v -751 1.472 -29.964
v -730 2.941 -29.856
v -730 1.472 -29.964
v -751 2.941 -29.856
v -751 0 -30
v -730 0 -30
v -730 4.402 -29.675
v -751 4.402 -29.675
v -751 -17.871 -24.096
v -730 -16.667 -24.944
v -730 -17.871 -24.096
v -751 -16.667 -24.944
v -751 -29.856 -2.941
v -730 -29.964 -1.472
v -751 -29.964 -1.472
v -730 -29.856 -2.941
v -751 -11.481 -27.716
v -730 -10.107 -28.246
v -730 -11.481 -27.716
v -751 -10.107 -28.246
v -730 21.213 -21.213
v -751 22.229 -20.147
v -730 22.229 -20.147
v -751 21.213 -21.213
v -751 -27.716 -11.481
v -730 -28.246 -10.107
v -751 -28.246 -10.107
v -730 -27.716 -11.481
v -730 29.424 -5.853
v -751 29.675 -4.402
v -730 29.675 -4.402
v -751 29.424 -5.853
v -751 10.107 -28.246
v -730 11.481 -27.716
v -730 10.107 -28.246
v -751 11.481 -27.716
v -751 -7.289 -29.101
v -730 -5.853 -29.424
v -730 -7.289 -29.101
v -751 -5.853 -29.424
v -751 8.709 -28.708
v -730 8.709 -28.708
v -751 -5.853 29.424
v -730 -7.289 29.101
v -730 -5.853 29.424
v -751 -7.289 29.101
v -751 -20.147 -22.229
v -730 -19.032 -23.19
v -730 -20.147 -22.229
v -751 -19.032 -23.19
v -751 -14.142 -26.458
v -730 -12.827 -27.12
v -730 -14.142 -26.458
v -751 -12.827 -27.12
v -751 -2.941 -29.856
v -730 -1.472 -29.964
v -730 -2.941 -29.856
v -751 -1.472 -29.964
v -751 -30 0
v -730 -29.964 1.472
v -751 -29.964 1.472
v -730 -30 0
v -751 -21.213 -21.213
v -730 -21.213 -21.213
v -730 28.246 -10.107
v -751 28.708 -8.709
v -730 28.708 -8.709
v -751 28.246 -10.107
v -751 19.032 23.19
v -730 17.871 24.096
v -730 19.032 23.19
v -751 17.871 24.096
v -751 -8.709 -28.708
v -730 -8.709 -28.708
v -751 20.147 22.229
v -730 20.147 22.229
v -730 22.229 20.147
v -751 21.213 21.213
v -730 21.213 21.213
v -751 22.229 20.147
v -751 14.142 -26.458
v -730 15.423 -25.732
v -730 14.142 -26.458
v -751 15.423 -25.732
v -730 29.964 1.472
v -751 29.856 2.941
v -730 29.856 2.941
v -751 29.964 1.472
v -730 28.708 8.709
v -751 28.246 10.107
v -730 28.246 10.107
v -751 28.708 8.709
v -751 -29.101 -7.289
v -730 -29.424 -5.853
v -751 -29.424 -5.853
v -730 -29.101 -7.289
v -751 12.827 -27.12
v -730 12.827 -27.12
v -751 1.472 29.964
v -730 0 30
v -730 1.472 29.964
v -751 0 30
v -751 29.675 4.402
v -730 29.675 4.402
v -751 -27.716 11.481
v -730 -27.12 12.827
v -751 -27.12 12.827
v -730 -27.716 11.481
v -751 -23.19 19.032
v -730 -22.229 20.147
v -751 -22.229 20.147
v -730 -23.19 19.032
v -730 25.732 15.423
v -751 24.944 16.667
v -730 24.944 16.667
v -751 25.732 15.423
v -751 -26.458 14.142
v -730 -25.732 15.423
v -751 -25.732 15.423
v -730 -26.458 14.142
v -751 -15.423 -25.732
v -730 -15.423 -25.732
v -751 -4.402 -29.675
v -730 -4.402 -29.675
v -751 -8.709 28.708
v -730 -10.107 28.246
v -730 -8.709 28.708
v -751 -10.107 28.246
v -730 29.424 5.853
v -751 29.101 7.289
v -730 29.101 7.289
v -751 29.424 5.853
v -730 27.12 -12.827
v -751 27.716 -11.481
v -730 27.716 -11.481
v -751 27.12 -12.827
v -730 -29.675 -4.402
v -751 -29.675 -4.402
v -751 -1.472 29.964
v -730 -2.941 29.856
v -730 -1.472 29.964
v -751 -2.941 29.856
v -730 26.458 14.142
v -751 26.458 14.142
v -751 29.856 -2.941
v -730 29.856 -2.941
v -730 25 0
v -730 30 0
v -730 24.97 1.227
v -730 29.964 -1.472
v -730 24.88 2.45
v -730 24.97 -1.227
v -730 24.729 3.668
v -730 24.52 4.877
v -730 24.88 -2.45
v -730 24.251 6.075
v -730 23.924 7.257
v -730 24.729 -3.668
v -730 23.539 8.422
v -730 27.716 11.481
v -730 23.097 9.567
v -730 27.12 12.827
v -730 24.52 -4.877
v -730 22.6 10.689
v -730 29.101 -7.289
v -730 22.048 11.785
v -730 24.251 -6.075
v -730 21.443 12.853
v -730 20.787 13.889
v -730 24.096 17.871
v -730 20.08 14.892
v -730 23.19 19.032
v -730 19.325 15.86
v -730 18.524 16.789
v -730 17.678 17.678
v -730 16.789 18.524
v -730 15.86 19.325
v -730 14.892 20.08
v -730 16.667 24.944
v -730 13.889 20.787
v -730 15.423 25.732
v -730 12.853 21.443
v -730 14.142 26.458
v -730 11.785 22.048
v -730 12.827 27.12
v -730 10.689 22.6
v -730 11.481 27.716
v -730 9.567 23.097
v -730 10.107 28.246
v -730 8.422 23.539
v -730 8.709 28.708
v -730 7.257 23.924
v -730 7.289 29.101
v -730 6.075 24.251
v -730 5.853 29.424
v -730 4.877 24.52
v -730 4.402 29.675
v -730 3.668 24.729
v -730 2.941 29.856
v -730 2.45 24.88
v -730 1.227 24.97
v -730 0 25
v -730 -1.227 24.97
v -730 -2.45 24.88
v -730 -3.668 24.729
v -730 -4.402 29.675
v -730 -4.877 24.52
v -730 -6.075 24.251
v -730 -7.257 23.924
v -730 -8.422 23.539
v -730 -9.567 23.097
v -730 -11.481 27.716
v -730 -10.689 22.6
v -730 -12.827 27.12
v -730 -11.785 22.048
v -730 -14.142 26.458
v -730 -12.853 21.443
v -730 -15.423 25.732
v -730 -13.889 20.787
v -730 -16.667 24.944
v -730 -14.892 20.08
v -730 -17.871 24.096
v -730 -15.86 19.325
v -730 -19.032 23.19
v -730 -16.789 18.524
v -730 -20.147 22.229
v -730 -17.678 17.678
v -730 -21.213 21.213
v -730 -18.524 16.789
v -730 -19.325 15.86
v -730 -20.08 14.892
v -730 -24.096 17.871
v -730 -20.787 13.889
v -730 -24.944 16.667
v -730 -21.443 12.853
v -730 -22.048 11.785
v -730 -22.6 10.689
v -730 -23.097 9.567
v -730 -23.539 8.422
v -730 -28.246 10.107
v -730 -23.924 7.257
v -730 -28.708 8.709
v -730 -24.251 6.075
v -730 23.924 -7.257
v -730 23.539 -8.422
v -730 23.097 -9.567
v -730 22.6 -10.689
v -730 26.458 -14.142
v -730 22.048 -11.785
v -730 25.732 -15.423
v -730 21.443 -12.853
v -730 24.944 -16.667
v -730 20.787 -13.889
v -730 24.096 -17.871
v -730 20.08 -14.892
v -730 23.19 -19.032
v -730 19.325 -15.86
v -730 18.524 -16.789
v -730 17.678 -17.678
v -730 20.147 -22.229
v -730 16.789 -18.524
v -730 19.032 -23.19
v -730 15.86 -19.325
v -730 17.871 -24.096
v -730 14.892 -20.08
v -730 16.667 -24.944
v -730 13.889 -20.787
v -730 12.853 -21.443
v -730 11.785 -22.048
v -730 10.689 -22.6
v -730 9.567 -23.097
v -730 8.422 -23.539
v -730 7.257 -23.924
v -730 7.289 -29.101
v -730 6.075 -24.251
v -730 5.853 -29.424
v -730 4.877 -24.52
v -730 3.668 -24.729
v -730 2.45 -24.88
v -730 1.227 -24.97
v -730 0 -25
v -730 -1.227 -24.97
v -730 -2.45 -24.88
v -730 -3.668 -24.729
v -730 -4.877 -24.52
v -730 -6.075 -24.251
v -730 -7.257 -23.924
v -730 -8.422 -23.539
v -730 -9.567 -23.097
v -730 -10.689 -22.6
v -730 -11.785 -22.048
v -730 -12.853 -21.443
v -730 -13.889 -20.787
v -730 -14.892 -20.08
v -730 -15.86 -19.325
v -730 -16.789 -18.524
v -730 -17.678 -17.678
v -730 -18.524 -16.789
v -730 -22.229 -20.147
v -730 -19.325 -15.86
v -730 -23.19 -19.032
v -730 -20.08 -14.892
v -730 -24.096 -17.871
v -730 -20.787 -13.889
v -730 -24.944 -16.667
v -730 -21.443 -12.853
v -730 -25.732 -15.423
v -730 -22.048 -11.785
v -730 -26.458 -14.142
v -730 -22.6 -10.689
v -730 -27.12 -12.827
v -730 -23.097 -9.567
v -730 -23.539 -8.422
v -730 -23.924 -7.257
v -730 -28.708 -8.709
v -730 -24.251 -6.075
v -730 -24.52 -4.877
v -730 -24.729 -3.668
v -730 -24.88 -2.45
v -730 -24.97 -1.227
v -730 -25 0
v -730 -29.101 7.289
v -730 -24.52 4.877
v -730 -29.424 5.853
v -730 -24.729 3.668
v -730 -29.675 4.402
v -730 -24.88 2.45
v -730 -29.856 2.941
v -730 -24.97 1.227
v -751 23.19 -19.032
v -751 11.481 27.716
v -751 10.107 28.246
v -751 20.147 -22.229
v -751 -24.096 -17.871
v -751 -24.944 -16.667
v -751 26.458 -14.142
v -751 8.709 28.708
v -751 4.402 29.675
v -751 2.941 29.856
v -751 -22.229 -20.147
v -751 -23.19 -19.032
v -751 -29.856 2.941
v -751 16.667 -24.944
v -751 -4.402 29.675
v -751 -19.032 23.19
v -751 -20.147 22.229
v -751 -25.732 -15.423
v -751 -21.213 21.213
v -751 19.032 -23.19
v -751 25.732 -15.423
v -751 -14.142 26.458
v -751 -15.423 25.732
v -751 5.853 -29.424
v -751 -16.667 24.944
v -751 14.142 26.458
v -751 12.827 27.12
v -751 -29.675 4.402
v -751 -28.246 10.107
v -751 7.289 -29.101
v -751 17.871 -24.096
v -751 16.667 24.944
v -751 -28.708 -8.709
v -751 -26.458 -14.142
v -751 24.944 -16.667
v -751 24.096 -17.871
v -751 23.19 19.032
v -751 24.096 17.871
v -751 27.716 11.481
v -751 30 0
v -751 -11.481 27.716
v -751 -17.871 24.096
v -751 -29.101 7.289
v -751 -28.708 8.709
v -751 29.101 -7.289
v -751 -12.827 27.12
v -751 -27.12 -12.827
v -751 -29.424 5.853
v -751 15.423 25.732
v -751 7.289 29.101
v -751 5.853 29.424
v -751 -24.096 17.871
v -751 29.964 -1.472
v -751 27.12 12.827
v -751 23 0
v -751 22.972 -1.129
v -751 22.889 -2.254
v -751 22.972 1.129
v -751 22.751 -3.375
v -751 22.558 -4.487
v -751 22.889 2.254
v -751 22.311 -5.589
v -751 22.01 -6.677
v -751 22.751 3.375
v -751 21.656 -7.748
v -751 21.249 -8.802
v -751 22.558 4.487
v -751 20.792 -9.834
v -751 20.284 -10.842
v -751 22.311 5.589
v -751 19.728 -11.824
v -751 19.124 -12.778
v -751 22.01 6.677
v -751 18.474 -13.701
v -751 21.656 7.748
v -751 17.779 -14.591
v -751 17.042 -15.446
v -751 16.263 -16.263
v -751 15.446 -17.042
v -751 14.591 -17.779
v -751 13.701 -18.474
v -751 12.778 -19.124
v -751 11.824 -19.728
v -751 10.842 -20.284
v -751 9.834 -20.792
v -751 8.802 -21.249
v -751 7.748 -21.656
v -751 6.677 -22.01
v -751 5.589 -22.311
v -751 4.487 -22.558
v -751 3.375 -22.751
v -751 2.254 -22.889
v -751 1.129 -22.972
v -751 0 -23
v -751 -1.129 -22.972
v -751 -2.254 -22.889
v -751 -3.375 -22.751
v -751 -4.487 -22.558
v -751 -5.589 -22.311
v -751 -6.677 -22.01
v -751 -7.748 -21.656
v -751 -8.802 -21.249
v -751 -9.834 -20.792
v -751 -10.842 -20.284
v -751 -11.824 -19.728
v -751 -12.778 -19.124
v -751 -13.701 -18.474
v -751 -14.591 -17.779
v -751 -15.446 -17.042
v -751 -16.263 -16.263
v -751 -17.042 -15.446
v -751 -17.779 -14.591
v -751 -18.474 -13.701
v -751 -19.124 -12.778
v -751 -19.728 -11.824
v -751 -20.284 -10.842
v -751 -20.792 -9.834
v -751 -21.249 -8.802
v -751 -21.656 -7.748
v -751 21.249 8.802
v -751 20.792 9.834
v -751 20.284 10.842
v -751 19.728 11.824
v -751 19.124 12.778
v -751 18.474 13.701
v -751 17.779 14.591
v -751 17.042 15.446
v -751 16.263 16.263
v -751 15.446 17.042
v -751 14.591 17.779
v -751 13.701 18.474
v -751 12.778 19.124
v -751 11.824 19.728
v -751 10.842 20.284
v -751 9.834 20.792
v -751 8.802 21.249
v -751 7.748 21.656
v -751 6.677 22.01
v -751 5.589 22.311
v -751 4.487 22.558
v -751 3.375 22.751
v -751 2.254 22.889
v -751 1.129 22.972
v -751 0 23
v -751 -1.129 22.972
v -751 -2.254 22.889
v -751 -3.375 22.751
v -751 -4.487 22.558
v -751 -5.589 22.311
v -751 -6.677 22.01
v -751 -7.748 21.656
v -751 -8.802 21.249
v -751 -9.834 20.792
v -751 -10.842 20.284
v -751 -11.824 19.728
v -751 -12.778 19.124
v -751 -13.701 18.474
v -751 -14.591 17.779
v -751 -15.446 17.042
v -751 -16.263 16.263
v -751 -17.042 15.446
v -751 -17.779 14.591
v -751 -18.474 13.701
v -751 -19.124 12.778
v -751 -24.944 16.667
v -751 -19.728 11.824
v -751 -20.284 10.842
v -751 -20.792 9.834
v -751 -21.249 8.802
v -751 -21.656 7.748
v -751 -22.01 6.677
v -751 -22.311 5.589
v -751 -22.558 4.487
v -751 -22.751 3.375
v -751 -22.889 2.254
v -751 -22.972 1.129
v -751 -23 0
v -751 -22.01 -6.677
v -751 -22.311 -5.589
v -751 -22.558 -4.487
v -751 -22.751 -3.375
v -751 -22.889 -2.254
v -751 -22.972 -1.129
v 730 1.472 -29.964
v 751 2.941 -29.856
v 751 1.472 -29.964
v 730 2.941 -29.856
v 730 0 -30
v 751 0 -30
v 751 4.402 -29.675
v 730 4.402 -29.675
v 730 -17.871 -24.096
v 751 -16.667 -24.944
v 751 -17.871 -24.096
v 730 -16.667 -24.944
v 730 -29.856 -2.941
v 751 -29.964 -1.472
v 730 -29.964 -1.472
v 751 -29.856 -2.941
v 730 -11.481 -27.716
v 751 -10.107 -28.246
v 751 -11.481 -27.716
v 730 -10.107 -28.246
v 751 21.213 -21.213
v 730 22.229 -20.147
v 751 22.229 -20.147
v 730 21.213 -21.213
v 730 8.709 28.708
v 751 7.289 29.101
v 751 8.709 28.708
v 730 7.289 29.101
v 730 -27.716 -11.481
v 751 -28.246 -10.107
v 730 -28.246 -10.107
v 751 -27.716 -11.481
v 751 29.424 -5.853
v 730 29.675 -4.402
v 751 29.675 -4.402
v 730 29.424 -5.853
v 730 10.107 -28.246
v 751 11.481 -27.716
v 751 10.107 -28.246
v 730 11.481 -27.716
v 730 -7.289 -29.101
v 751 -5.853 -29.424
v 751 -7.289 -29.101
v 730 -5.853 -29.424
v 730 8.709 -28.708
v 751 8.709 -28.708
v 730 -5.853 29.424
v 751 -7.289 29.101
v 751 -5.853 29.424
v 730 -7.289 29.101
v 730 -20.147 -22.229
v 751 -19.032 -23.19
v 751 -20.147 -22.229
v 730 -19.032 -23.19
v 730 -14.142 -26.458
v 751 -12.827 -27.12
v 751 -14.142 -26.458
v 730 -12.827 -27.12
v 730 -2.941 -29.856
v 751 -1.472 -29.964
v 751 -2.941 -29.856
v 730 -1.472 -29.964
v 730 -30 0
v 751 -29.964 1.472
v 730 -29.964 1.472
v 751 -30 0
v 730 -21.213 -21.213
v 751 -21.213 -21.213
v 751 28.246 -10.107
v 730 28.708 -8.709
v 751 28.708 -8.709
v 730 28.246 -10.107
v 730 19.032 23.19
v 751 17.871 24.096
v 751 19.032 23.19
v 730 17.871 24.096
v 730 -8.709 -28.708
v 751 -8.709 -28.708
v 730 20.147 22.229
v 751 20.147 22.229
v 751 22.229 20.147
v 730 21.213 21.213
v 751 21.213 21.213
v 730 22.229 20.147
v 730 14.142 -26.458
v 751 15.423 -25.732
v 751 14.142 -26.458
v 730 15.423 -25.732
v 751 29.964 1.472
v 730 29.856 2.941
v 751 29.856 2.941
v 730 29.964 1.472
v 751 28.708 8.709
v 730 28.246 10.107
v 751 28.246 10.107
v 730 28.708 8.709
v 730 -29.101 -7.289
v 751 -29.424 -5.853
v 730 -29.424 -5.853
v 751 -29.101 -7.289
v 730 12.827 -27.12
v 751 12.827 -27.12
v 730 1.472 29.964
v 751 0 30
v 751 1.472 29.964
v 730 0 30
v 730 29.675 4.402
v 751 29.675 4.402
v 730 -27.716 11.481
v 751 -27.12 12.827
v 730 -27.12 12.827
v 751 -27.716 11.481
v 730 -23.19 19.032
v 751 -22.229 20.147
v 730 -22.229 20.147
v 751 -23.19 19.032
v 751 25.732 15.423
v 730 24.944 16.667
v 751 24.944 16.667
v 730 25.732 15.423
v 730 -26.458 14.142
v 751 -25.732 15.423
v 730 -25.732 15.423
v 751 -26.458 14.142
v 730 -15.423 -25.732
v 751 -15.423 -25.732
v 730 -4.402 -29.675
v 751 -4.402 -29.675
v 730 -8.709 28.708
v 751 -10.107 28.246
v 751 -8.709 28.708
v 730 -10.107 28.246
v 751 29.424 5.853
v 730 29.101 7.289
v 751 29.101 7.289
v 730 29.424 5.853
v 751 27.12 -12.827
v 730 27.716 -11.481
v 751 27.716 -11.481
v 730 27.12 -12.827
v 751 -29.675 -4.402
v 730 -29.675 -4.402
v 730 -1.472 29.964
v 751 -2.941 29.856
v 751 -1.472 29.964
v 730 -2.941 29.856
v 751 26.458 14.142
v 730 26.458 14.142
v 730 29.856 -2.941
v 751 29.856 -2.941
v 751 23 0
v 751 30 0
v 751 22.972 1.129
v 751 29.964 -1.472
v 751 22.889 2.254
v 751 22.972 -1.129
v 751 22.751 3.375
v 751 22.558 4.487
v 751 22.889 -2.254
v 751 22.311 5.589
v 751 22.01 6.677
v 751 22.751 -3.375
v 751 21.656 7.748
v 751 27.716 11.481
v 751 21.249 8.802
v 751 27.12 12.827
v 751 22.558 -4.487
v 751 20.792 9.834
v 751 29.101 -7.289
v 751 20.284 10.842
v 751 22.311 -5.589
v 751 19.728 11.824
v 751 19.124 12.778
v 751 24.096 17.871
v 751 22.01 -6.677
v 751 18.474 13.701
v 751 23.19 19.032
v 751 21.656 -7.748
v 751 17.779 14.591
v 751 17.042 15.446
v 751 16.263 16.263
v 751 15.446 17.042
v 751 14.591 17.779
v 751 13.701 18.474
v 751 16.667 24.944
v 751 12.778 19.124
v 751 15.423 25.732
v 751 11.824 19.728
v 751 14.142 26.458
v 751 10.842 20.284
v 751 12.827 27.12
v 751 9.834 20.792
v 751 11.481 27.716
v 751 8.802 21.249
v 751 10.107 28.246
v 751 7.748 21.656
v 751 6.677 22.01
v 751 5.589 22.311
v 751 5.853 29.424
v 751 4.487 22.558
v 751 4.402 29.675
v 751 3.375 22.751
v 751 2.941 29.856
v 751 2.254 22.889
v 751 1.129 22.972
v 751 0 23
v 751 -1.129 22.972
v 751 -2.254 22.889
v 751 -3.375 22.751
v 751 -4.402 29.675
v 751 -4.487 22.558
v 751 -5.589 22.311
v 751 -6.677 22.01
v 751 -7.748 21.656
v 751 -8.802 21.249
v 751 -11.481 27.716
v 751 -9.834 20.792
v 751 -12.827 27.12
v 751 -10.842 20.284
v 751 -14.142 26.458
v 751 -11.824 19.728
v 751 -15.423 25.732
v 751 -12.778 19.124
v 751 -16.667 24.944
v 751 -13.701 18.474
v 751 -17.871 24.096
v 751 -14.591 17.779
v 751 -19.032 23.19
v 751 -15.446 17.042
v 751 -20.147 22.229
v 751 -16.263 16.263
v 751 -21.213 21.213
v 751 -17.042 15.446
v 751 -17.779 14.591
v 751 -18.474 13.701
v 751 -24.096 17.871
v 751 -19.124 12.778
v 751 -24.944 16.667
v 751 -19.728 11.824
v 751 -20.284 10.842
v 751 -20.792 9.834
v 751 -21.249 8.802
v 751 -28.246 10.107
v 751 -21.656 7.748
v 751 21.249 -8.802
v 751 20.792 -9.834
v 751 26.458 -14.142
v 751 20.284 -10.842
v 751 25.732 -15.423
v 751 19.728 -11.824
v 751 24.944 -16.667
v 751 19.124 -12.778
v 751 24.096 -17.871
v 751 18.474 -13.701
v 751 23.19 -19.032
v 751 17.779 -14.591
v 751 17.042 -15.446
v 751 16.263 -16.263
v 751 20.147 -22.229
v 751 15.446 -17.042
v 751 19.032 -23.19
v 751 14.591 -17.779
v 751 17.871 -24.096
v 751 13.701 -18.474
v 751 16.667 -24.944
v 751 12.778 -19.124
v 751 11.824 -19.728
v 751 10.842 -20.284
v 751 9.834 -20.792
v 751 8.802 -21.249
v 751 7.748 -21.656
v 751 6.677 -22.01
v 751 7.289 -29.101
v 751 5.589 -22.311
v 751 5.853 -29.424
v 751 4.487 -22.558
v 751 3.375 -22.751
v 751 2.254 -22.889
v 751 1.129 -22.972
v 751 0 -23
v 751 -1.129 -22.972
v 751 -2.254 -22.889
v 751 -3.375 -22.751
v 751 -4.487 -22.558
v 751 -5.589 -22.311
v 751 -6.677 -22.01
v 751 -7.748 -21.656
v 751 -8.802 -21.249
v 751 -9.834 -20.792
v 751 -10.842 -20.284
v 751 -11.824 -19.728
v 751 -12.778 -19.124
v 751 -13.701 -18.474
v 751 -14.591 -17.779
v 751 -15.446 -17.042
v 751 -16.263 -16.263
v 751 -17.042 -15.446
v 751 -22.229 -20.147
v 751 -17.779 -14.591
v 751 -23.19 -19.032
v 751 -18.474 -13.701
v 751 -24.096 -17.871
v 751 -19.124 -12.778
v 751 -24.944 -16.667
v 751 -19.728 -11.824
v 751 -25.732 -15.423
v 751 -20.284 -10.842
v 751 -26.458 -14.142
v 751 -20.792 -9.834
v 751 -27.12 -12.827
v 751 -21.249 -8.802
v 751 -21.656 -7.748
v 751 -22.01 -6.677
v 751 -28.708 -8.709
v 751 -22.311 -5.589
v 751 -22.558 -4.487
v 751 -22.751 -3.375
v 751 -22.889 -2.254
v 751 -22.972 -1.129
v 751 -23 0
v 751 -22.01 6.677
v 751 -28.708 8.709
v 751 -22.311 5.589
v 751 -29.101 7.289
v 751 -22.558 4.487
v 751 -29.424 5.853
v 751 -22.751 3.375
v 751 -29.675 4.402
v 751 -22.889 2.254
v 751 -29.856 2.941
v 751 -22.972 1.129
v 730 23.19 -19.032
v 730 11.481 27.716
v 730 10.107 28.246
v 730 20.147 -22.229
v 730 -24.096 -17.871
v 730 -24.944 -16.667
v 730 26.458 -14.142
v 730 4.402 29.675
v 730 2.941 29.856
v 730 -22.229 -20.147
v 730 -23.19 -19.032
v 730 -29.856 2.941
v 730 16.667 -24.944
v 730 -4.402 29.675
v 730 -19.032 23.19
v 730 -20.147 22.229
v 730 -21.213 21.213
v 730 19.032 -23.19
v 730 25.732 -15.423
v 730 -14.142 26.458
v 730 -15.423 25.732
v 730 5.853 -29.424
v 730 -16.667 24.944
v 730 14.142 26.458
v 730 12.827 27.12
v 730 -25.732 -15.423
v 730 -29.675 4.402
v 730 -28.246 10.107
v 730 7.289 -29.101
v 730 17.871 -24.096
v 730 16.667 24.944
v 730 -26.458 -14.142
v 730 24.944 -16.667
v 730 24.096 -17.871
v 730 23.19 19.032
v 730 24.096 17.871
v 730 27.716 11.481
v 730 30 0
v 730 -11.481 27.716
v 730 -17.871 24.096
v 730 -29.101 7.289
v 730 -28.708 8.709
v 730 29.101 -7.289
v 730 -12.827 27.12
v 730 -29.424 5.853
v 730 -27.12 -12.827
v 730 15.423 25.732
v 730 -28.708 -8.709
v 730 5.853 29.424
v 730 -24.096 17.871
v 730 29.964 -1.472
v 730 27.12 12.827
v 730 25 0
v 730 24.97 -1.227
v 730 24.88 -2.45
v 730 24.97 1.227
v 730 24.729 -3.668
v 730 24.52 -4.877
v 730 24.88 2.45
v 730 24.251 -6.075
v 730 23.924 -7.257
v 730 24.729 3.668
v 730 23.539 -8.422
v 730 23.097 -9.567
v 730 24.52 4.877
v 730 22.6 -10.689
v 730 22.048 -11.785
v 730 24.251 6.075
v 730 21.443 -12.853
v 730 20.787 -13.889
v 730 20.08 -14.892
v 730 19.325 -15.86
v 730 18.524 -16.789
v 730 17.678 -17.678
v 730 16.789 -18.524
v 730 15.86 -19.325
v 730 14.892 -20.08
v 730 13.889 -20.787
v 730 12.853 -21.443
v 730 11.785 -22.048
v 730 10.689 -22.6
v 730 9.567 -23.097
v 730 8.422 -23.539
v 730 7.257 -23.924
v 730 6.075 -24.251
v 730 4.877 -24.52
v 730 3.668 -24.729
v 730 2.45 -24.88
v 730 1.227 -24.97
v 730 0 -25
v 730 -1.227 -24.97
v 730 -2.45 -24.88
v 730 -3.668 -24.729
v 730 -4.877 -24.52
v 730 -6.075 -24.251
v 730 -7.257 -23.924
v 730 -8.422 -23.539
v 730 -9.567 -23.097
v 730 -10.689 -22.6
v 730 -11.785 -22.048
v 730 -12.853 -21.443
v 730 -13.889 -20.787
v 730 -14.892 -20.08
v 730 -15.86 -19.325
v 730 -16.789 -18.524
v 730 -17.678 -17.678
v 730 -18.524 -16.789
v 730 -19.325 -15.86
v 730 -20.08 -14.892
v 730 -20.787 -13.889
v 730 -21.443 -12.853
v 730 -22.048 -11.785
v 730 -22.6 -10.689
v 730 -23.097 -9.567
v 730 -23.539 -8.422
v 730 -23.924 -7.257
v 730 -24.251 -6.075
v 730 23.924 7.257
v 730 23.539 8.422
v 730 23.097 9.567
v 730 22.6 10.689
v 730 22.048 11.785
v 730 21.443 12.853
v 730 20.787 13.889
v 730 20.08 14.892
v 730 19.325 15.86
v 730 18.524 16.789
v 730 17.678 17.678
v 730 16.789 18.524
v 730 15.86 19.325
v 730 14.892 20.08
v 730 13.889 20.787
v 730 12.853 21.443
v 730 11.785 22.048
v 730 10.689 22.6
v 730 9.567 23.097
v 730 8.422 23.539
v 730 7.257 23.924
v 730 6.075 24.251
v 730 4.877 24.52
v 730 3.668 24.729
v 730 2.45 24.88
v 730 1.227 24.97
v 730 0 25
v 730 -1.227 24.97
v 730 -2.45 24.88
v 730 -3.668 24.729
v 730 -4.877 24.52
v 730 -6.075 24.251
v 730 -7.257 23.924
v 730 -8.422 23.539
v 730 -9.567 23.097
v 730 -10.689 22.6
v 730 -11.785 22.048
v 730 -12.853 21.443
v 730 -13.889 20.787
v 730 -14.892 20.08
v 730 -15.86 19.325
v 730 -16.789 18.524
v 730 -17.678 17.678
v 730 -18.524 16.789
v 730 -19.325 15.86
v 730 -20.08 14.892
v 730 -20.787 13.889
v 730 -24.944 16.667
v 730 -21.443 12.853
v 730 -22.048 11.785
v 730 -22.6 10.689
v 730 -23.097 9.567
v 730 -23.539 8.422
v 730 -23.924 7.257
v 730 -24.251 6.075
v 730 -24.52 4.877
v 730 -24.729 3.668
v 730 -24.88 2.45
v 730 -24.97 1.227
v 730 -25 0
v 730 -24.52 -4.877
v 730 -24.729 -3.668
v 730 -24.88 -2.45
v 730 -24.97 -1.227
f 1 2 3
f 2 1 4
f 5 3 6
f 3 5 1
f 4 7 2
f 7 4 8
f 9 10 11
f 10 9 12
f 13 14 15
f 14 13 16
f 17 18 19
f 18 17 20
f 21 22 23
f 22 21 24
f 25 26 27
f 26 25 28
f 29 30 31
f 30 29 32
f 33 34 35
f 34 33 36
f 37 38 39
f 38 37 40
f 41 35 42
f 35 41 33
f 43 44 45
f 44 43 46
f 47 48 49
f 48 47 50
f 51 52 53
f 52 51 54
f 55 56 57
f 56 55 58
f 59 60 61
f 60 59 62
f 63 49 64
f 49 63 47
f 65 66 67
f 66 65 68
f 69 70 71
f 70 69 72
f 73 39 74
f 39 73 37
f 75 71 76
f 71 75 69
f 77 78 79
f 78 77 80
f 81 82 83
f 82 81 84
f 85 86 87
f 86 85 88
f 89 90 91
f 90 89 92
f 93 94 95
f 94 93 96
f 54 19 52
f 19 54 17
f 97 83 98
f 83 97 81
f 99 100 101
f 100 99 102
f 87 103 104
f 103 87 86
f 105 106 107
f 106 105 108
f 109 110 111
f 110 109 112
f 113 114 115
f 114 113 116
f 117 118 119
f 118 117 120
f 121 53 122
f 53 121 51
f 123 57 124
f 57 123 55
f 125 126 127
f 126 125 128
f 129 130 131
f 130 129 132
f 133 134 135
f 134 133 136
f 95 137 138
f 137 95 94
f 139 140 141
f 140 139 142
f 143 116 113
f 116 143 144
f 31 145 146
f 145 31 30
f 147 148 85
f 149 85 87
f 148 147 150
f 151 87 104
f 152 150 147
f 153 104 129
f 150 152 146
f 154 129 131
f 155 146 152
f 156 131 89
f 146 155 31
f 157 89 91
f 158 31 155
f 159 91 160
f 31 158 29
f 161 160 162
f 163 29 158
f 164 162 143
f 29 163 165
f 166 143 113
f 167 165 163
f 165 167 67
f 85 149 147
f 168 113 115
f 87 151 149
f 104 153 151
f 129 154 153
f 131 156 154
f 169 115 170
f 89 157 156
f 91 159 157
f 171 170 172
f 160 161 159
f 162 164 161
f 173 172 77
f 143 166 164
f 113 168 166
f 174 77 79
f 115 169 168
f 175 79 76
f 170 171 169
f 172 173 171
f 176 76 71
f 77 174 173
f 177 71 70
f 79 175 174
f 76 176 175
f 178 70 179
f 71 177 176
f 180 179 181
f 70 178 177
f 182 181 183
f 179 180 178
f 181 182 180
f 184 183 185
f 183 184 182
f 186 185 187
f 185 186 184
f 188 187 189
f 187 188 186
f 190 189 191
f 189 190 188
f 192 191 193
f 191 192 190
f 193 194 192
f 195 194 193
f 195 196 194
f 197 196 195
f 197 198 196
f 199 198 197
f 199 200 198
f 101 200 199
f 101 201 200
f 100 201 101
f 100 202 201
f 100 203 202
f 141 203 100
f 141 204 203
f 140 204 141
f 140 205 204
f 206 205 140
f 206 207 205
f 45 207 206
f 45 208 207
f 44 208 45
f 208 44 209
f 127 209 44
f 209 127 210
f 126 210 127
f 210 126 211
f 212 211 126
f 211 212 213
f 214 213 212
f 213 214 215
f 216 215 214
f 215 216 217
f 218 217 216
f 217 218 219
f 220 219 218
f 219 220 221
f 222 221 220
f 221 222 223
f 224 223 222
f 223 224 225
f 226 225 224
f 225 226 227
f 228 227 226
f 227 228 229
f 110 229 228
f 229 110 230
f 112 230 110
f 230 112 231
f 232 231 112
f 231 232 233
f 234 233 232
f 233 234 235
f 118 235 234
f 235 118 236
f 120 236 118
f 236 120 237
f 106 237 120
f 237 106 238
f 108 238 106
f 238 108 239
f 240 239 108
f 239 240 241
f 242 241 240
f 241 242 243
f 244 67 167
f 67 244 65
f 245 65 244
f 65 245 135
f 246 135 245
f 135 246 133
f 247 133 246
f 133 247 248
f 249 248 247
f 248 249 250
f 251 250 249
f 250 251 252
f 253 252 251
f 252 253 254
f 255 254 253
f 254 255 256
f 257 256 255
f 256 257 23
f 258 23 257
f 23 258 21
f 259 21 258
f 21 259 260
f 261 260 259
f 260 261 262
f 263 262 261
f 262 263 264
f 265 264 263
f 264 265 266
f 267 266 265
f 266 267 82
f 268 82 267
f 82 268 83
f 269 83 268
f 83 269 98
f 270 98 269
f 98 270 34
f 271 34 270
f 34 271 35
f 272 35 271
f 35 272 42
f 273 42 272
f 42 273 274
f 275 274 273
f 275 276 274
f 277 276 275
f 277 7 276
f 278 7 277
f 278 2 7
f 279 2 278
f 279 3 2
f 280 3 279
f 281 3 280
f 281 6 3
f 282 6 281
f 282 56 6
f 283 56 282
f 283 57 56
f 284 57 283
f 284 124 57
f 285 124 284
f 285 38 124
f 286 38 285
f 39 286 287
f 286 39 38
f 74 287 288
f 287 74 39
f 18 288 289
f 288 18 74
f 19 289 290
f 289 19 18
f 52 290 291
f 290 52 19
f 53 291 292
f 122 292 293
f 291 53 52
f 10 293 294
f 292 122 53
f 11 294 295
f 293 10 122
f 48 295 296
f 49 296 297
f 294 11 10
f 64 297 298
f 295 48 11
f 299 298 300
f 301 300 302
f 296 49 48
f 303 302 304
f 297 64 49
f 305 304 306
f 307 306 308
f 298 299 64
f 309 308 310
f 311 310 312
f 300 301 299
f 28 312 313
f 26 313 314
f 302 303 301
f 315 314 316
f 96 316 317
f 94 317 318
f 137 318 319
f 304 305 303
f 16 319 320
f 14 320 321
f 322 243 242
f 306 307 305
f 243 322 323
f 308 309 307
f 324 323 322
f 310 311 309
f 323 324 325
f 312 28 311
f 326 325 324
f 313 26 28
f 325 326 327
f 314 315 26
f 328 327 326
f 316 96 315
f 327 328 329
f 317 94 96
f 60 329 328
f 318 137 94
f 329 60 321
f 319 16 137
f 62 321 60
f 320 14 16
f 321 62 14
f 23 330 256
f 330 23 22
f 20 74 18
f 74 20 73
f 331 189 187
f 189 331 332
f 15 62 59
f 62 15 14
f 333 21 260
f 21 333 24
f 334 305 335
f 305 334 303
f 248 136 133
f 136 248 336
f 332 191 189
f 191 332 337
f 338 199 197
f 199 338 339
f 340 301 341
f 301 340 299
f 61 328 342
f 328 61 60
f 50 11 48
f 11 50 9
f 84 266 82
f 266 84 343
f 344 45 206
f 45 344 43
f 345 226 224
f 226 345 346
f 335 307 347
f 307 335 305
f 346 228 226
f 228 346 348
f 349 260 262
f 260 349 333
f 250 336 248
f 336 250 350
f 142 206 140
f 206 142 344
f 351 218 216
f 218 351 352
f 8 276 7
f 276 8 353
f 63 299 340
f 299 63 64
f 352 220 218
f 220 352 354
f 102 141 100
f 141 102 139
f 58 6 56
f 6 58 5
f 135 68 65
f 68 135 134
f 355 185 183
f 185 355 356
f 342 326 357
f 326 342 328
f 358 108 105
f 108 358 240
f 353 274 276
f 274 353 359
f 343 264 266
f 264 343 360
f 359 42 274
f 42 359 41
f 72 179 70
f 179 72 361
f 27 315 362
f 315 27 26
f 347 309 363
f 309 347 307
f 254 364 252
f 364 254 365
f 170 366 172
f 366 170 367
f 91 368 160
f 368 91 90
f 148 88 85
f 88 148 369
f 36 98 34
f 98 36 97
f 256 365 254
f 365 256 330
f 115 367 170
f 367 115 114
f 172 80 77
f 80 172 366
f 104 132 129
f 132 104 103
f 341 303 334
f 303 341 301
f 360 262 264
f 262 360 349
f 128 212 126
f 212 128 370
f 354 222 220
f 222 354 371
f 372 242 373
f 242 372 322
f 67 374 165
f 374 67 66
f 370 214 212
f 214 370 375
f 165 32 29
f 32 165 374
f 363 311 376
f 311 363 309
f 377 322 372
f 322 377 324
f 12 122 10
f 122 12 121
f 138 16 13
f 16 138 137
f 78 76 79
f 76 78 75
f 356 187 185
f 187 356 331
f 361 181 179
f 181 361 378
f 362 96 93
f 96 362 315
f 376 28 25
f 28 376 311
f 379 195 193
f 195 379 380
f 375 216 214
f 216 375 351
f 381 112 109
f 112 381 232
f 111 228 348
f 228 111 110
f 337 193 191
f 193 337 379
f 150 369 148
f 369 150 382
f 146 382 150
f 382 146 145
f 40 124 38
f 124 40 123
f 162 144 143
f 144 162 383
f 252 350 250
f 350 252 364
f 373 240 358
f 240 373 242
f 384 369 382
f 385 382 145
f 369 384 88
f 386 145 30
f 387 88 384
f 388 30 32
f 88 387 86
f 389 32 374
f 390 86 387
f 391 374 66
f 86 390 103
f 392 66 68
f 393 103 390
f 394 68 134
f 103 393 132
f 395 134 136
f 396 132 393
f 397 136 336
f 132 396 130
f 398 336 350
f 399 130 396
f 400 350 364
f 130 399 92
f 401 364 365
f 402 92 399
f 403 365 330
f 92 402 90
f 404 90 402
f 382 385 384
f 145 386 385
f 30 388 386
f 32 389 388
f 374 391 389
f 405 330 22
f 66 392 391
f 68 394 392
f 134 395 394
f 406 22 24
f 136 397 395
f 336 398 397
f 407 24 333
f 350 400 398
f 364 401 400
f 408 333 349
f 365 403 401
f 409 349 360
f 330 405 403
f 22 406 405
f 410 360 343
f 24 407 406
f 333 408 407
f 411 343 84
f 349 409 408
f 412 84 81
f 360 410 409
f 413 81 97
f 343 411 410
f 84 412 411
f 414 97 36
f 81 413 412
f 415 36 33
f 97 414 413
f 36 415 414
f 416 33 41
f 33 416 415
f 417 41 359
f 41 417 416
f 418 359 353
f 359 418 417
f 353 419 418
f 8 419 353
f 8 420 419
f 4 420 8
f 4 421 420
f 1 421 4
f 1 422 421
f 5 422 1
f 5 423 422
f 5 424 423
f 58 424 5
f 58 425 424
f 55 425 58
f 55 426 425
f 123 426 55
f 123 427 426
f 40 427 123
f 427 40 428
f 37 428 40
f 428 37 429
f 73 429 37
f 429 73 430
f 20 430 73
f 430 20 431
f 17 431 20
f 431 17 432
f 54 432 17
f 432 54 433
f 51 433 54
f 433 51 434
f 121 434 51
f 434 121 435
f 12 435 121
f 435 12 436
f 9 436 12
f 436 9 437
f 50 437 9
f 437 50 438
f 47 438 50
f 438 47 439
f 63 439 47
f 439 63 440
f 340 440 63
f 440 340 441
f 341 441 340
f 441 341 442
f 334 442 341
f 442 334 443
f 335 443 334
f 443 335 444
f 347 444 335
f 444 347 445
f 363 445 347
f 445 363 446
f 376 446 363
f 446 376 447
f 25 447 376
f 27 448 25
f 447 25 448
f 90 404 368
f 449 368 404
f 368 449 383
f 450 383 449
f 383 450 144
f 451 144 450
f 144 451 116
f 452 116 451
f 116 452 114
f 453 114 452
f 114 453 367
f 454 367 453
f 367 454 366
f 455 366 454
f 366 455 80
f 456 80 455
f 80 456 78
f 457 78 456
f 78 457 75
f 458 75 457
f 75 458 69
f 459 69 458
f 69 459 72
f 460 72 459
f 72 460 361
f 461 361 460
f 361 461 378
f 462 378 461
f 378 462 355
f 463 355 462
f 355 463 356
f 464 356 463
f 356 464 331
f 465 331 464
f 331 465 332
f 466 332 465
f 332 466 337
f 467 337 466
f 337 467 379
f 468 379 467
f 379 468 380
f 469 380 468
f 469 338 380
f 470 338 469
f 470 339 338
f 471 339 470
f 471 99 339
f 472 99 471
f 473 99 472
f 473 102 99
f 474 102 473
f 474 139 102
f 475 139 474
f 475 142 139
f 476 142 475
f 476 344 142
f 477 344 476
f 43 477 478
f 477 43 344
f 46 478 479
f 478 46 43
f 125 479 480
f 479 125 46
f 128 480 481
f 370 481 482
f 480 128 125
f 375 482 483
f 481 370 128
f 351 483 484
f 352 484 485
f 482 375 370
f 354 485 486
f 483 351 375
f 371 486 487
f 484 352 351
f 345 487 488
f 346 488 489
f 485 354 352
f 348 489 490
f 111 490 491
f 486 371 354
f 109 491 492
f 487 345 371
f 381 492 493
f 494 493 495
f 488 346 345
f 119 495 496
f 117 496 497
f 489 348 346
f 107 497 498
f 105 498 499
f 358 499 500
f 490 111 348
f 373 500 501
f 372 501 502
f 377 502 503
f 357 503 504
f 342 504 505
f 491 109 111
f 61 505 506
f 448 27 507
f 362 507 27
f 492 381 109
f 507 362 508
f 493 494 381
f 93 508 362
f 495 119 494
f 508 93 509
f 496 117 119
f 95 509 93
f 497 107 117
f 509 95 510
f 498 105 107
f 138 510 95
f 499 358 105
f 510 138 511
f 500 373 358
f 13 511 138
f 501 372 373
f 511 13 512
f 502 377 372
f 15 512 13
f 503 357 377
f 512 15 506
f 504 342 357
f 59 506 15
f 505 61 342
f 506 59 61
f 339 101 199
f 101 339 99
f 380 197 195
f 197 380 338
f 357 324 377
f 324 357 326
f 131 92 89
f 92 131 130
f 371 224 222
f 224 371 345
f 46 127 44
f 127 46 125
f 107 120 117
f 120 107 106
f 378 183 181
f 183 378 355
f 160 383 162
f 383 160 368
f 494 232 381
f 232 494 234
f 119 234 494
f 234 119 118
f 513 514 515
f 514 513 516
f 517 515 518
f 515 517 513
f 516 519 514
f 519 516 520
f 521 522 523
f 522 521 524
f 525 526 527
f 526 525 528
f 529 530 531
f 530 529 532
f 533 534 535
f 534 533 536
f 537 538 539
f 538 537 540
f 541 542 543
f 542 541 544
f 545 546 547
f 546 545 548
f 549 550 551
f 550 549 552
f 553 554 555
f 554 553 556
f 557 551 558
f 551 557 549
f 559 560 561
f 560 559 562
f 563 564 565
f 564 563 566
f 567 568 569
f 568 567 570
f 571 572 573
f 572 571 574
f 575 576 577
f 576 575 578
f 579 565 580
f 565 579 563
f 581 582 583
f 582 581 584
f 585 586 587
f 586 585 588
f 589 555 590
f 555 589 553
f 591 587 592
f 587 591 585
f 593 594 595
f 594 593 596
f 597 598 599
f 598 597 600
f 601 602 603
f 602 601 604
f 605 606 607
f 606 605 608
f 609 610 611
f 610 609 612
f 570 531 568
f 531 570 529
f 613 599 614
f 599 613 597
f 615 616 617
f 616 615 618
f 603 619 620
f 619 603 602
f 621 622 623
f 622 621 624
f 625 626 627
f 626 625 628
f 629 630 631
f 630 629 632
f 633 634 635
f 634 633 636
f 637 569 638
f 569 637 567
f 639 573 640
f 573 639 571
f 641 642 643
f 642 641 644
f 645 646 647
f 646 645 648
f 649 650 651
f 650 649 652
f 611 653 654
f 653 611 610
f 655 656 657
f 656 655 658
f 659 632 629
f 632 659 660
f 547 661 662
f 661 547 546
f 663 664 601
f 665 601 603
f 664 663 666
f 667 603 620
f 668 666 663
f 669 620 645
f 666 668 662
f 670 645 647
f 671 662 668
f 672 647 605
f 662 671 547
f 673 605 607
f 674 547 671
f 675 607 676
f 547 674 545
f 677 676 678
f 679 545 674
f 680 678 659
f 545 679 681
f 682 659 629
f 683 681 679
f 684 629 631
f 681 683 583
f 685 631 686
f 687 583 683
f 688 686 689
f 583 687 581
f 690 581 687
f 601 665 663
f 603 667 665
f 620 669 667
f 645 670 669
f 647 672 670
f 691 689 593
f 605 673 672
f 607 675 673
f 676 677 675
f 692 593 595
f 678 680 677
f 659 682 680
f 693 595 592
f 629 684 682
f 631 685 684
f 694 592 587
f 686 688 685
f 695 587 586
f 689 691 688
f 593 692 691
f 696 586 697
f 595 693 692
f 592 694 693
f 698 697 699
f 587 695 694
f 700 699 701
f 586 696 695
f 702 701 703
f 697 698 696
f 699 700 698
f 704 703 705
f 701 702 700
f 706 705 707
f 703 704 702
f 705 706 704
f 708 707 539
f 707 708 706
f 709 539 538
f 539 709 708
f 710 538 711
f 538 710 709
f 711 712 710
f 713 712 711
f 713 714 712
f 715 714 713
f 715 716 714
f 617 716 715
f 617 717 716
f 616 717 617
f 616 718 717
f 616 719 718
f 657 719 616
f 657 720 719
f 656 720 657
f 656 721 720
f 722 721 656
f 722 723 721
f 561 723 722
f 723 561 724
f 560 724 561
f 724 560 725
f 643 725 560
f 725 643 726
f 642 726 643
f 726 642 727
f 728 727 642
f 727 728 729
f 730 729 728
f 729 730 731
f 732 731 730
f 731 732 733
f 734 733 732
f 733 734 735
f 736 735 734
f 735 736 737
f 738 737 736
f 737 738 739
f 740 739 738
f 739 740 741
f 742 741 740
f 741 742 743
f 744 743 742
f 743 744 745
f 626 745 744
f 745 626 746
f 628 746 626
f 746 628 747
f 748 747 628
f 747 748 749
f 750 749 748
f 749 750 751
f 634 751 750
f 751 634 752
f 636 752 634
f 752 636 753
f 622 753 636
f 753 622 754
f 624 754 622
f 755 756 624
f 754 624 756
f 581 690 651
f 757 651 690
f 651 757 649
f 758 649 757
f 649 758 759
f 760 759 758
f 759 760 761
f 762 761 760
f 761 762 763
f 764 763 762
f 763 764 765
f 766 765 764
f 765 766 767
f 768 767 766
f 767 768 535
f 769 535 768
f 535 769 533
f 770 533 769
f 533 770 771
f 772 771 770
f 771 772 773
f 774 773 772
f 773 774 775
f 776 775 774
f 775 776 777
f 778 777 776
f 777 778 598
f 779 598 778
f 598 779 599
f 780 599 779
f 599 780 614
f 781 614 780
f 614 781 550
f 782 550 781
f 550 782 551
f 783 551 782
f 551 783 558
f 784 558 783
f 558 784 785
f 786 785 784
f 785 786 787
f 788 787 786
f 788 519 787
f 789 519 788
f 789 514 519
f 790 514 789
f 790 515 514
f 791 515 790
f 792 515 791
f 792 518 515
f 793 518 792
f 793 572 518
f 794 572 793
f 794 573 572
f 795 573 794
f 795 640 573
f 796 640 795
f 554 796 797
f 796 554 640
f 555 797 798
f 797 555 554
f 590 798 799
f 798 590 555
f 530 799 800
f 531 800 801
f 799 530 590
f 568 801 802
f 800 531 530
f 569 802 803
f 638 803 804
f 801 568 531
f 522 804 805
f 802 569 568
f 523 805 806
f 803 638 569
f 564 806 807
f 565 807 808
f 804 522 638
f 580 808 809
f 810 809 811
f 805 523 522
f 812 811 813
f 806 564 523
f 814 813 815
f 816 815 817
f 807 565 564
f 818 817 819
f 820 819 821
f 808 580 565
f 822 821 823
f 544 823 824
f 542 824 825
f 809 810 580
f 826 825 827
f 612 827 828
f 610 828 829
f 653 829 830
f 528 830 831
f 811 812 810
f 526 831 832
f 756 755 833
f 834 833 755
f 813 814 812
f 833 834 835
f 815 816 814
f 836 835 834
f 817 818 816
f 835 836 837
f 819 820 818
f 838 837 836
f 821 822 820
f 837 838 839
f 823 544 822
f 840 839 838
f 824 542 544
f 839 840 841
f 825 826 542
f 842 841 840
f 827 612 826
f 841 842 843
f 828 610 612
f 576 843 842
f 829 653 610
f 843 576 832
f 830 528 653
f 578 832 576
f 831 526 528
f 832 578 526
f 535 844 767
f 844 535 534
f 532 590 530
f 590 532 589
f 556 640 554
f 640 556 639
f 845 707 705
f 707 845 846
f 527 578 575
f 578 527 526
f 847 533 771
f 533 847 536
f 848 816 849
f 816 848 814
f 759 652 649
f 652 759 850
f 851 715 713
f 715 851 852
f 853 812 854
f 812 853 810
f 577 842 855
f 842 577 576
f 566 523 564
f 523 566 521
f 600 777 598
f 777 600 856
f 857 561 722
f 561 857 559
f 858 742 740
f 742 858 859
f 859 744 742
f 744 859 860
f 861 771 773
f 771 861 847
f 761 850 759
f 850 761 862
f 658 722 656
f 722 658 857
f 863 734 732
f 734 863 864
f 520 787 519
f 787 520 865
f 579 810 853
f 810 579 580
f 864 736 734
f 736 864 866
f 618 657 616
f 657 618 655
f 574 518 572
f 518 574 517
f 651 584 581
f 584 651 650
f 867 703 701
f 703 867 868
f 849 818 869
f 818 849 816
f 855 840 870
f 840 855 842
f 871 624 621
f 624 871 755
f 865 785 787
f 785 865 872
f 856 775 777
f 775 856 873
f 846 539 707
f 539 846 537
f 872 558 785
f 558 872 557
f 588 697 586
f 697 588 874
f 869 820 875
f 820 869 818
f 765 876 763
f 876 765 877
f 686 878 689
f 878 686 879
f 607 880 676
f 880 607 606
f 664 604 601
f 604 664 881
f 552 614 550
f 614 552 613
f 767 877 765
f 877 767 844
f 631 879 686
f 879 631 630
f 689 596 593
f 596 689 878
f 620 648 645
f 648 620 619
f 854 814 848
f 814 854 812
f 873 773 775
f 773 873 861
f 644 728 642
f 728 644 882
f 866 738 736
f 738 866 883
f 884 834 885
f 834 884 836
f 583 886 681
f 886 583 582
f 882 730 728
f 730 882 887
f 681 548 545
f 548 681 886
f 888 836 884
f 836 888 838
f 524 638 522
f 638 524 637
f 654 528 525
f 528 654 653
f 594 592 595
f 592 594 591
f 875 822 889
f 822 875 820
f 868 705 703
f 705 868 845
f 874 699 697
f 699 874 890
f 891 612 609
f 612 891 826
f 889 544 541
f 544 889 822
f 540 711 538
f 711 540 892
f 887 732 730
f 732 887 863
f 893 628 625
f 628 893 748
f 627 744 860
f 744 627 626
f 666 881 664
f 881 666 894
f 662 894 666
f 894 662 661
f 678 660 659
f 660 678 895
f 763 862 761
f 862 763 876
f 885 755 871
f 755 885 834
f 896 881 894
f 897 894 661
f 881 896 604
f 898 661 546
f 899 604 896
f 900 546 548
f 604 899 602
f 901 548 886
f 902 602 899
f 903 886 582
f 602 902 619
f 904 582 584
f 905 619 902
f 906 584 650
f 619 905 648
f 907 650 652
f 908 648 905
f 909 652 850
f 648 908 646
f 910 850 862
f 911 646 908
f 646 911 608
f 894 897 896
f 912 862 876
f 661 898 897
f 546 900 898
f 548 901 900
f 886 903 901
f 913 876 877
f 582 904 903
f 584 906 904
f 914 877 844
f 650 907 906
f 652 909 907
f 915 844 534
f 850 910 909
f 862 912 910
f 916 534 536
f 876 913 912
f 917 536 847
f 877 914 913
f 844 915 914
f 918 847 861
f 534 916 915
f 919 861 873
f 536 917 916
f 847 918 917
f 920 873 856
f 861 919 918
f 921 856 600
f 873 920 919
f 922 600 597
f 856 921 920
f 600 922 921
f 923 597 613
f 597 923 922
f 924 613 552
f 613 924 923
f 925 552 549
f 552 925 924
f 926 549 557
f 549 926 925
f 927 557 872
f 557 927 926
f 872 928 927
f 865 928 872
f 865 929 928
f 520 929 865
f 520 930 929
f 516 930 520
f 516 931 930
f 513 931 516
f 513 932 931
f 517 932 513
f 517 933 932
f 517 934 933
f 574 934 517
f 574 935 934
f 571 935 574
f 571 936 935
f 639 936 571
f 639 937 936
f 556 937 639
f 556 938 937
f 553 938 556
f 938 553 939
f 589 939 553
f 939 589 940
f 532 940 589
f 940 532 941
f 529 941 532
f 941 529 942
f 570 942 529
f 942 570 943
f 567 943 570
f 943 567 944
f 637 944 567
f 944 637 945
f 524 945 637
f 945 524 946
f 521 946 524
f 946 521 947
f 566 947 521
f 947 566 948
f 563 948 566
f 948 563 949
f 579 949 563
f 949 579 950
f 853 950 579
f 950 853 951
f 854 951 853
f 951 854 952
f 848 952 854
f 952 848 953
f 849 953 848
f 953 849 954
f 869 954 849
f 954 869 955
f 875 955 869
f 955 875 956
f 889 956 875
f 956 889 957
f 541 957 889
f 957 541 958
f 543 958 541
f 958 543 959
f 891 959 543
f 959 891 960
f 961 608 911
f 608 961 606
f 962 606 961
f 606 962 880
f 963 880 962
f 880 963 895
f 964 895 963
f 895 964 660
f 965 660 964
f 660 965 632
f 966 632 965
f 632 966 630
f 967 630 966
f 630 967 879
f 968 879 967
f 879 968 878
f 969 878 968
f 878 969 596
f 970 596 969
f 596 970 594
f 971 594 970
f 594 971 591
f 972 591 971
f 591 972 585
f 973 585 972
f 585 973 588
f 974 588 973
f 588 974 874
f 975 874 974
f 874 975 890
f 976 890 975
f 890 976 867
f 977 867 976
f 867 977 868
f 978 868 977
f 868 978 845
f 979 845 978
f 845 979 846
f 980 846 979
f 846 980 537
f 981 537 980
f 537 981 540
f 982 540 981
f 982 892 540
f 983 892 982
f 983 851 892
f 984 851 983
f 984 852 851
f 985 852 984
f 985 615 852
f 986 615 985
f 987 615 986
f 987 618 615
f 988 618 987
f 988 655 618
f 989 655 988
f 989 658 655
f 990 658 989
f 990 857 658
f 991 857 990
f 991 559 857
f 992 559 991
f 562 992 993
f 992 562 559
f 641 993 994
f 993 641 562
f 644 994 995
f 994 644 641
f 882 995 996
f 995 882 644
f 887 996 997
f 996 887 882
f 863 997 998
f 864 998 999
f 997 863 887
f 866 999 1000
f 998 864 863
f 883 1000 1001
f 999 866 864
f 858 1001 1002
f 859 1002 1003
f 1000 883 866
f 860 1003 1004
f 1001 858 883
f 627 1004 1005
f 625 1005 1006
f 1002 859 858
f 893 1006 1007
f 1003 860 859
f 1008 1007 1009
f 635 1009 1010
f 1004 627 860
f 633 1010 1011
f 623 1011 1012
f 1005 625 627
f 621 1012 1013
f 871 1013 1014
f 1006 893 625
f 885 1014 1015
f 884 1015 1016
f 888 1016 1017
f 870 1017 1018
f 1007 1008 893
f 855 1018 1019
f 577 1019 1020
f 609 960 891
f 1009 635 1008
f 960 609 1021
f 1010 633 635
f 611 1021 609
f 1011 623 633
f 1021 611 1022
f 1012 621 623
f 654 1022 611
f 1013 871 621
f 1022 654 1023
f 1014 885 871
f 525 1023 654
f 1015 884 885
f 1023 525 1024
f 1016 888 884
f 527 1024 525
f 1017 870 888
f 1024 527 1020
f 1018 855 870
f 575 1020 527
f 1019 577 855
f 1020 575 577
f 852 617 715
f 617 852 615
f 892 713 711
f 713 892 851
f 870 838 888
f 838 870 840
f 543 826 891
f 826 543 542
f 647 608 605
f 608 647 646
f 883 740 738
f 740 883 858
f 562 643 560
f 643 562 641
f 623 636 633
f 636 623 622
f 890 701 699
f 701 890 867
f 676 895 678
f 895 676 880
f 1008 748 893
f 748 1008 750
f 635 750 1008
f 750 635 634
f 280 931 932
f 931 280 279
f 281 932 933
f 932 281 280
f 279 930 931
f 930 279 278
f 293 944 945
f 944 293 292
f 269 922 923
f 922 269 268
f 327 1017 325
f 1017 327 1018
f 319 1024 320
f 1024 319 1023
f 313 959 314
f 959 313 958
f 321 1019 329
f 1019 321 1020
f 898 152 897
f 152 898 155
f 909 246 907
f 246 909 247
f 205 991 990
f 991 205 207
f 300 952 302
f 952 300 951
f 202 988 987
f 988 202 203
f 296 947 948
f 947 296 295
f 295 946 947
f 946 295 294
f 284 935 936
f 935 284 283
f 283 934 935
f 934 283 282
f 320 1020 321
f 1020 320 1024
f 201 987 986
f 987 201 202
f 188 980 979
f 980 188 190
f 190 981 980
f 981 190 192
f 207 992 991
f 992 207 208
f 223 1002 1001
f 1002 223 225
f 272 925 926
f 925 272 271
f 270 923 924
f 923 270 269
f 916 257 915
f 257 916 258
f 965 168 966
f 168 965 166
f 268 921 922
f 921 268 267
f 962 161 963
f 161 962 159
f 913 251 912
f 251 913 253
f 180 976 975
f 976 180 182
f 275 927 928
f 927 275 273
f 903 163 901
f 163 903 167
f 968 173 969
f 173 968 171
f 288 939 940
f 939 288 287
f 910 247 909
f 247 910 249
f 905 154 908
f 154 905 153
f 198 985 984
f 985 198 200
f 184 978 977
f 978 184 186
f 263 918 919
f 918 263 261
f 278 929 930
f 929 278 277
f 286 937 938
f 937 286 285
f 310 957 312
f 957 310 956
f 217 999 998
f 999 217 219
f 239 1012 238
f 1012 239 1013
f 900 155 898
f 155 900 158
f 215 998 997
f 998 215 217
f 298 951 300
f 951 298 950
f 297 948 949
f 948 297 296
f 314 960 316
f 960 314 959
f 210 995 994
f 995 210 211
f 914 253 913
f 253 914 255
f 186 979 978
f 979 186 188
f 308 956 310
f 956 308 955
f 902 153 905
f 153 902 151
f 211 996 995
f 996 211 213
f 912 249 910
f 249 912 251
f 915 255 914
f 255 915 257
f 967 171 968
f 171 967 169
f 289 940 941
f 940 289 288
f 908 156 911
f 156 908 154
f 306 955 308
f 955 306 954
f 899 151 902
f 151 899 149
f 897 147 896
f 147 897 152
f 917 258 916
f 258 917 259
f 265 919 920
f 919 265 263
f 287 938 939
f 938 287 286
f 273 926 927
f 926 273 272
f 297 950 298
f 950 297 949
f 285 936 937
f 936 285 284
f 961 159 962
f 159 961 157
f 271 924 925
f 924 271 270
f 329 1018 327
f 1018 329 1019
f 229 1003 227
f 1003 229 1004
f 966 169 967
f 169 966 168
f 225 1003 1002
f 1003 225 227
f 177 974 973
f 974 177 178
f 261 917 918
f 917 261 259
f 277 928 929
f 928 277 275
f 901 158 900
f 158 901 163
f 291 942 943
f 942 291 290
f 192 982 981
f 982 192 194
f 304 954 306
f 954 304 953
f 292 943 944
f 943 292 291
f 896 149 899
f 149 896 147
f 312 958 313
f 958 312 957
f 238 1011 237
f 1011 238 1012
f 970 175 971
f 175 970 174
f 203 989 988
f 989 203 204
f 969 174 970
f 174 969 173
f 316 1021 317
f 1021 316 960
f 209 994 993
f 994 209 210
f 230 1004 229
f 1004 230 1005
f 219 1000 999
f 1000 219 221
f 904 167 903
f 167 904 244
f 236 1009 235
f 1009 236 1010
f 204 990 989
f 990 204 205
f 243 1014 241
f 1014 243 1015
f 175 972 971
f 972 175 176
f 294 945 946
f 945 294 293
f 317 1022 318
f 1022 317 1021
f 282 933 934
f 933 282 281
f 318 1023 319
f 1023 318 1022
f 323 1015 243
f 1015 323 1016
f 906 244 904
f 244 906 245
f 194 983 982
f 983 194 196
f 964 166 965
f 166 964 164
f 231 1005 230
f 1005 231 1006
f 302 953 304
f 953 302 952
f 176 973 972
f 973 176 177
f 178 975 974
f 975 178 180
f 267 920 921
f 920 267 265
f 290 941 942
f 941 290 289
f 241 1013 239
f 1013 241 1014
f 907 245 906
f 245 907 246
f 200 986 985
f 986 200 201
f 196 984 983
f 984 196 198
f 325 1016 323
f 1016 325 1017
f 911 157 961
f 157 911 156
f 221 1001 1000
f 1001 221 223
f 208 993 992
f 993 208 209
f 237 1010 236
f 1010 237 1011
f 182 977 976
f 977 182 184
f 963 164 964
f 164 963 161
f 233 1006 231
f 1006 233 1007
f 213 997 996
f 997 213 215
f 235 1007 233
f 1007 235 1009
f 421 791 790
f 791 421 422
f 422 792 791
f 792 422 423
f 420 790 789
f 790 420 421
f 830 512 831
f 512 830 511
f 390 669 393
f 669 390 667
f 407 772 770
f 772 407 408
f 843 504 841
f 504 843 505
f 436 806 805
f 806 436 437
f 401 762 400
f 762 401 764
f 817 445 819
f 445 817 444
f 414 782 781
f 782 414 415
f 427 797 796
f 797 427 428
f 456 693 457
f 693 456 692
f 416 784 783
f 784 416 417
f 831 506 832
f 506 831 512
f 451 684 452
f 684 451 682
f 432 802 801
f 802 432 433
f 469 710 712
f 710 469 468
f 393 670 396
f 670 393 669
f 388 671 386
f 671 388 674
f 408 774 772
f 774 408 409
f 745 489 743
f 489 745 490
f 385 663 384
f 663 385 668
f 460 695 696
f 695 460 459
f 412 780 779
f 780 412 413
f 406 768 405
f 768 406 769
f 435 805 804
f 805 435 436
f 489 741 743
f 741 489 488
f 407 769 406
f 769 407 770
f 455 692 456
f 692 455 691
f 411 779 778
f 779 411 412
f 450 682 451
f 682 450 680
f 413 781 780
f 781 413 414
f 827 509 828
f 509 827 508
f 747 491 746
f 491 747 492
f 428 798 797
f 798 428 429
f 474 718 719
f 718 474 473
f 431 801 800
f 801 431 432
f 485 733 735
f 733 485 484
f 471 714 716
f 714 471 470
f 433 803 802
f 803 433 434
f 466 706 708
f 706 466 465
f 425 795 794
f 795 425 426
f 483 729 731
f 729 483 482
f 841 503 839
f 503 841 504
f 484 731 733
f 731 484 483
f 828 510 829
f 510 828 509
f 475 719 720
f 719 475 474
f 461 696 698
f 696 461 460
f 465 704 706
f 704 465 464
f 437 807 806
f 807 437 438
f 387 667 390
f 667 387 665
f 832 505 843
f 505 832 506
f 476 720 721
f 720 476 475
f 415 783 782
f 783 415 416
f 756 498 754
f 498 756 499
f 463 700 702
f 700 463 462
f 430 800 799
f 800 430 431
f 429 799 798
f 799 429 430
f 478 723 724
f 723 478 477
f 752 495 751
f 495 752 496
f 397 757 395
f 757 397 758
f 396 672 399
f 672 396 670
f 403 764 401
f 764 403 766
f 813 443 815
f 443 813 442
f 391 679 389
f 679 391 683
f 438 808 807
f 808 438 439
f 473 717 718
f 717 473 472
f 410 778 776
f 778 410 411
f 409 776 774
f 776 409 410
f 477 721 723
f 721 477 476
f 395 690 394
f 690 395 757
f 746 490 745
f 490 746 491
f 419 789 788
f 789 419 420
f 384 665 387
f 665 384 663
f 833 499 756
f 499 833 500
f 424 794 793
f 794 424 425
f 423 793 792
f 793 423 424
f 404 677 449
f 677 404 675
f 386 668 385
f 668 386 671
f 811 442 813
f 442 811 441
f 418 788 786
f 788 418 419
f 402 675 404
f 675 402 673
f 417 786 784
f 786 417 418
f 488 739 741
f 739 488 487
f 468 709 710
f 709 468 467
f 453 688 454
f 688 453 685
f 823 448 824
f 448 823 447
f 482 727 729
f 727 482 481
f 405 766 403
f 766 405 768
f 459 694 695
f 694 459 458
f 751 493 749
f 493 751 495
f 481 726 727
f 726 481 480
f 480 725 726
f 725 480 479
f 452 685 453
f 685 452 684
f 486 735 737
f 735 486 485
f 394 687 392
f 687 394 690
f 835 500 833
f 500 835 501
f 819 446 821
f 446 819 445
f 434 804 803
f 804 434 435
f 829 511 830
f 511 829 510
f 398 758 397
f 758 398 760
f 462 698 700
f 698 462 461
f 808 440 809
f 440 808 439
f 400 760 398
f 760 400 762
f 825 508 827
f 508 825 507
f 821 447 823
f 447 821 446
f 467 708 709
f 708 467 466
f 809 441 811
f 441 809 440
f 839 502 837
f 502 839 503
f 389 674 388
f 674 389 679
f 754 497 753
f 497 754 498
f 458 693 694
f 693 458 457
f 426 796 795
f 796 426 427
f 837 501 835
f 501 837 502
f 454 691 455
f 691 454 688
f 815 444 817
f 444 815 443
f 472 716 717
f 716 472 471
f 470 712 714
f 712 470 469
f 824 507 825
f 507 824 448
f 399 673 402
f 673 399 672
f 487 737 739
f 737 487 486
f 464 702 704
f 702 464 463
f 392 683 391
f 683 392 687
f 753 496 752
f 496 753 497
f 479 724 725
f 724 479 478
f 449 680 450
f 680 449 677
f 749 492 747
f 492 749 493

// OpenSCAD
$fn = 128;

// HT 50 pipe (nominal): outer diameter 50 mm, length 1500 mm
pipe_od  = 50;     // mm
wall_t   = 2;      // mm
pipe_len = 1500;   // mm

// Simple socket-like end fittings (fully connected)
socket_len = 20;           // mm (axial length of each socket)
socket_od  = pipe_od + 10; // mm (outer diameter at socket)
overlap    = 0.5;          // mm (ensures watertight union/difference)

module tube_z(od, id, h, center=true) {
    difference() {
        cylinder(h=h, d=od, center=center);
        cylinder(h=h + 2*overlap, d=id, center=center);
    }
}

module ht_pipe() {
    id = pipe_od - 2*wall_t;

    // Build as one connected solid: outer union, then subtract one continuous inner bore
    difference() {
        union() {
            // Outer main pipe
            cylinder(h=pipe_len, d=pipe_od, center=true);

            // Outer socket sleeves, overlapped into main pipe
            for (s = [-1, 1]) {
                translate([0, 0, s*(pipe_len/2 - socket_len/2 + overlap)])
                    cylinder(h=socket_len + 2*overlap, d=socket_od, center=true);
            }
        }

        // Inner bore (continuous through entire length, including sockets)
        cylinder(h=pipe_len + 2*socket_len + 4*overlap, d=id, center=true);
    }
}

// Orient along X so FRONT/BACK/LEFT/RIGHT orthographic views show the 1500 mm length
rotate([0, 90, 0]) ht_pipe();
